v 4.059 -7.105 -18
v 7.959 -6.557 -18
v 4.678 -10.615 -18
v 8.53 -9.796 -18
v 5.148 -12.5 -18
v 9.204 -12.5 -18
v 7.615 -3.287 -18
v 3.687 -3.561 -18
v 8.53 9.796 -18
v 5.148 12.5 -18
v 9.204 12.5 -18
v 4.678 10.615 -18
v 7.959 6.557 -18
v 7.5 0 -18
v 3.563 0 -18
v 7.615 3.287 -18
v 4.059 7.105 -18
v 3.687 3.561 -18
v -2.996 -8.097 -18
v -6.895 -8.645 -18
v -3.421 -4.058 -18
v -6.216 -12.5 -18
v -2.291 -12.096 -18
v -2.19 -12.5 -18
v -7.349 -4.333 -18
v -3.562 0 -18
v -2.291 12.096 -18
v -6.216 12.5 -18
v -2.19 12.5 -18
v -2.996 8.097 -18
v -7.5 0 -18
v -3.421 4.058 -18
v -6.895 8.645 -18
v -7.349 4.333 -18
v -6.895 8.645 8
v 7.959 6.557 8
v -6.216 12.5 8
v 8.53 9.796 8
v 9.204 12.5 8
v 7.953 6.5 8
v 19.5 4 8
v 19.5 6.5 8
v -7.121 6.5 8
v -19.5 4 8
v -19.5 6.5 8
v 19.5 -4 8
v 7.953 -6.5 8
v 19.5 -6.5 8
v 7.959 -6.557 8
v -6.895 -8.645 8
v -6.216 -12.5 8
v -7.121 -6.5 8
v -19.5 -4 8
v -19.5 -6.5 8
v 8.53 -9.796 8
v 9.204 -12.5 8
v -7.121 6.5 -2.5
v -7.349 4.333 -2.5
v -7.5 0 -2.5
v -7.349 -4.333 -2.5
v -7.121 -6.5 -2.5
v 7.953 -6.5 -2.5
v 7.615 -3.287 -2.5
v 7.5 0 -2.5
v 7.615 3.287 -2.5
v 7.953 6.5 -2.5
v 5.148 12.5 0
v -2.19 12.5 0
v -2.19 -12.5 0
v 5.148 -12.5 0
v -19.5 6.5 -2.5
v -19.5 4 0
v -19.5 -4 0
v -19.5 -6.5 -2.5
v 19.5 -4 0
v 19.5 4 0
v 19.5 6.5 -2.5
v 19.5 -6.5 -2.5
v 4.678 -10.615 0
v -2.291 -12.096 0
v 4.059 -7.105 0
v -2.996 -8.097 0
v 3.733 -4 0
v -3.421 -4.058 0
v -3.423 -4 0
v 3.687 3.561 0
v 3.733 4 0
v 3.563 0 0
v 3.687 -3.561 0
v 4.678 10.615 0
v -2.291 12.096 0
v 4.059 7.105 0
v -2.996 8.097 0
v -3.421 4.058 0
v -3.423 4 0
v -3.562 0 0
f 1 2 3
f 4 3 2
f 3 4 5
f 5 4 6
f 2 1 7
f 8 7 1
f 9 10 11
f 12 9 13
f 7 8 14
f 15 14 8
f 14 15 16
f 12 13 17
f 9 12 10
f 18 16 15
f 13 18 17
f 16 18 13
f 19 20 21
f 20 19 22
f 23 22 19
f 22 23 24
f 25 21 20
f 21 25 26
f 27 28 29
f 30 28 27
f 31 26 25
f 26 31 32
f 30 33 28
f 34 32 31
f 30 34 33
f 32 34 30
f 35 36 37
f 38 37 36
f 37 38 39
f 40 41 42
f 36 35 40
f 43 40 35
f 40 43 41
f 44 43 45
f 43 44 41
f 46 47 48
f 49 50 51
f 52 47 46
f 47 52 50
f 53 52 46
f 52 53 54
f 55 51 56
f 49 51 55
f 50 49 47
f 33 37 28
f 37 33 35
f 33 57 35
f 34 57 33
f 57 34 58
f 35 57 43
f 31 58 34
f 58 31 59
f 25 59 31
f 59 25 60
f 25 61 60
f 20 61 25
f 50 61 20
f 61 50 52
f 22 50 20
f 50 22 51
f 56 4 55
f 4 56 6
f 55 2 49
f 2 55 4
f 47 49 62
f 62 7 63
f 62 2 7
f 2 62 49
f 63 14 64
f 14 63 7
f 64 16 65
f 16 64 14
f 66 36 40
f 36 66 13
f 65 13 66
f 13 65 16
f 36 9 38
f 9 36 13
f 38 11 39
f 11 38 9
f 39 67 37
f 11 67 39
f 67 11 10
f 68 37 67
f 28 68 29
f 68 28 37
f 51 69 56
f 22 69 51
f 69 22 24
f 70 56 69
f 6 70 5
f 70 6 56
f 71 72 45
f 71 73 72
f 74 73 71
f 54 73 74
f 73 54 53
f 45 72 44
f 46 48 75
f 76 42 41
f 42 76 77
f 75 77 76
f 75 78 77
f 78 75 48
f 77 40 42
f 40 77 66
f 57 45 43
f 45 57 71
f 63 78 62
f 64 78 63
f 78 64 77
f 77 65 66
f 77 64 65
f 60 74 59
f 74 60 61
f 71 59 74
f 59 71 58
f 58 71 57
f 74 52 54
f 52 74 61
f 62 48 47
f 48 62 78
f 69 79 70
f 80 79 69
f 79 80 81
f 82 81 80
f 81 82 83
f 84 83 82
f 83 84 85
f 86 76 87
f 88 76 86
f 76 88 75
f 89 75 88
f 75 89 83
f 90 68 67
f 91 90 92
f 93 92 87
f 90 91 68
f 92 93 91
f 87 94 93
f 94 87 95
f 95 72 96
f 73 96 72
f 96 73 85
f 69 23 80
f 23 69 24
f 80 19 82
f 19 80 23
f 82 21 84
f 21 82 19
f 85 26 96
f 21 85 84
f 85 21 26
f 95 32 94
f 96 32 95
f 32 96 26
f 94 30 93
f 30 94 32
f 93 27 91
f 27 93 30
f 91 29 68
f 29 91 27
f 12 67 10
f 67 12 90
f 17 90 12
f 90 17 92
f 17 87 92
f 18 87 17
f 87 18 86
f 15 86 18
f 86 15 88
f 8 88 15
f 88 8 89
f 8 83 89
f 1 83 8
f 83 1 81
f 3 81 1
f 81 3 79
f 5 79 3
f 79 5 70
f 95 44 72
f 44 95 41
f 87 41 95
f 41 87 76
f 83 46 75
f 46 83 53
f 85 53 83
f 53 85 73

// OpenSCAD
// file: ../utils/circles.scad
$fn=90;

module ring(outer_radius, inner_radius, center=true) {
    difference() {
        circle(r=outer_radius, center=center);
        circle(r=inner_radius, center=center);
    }
}

module torus(large_radius, small_radius, center=true) {
    rotate_extrude()
    translate([large_radius, 0, 0])
    circle(r=small_radius, center=center);
}
// main file
use <../utils/circles.scad>;

$fn = 90;

ID = 102.31;
OD = 116.16;
MID = (ID + OD) / 2;

HOLDER_WIDTH = 25;
HOLDER_THICKNESS = 15;
HOLDER_FOOT_LENGTH = 18;
HOLDER_FINGER_LENGTH = 8;
HODLER_FINGER_SPACING = 8;
LIP_THICKNESS = 2.5;
LIP_LENGTH = 12;

TOL = 0.1;

module baseHolder() {
    translate([MID / 2, 0, 0])
    intersection() {
        translate([0, 0, -HOLDER_FOOT_LENGTH])
        linear_extrude(HOLDER_FOOT_LENGTH + HOLDER_FINGER_LENGTH)
        ring(MID / 2 + HOLDER_THICKNESS / 2, MID / 2 - HOLDER_THICKNESS / 2);
        
        translate([-MID / 2, 0, -HOLDER_FOOT_LENGTH])
        linear_extrude(2 * (HOLDER_FOOT_LENGTH + HOLDER_FINGER_LENGTH)) 
        square([HOLDER_WIDTH, HOLDER_WIDTH], center=true);
    }
}

module holderLip() {
    translate([0, 0, (HOLDER_FINGER_LENGTH - LIP_THICKNESS)/ 2])
    rotate([0, 90, 0])
    linear_extrude(HOLDER_THICKNESS + 2 * LIP_LENGTH, center=true)
    square([HOLDER_FINGER_LENGTH + LIP_THICKNESS, HODLER_FINGER_SPACING + 2 * LIP_THICKNESS], center=true);
}

module cavities() {
    translate([MID / 2, 0, 0])
    rotate([180, 0, 0])
    linear_extrude(100)
    ring(outer_radius=OD / 2 + TOL, inner_radius=ID / 2 - TOL);
    
    translate([0, 0, HOLDER_FINGER_LENGTH / 2])
    rotate([0, 90, 0])
    linear_extrude(2 * HOLDER_THICKNESS + 2 * LIP_LENGTH, center=true)
    square([HOLDER_FINGER_LENGTH, HODLER_FINGER_SPACING], center=true);
}

module fullHolder() {
    difference() {
    union() {
        baseHolder();
        holderLip();
    }
    cavities();
}
}

fullHolder();
